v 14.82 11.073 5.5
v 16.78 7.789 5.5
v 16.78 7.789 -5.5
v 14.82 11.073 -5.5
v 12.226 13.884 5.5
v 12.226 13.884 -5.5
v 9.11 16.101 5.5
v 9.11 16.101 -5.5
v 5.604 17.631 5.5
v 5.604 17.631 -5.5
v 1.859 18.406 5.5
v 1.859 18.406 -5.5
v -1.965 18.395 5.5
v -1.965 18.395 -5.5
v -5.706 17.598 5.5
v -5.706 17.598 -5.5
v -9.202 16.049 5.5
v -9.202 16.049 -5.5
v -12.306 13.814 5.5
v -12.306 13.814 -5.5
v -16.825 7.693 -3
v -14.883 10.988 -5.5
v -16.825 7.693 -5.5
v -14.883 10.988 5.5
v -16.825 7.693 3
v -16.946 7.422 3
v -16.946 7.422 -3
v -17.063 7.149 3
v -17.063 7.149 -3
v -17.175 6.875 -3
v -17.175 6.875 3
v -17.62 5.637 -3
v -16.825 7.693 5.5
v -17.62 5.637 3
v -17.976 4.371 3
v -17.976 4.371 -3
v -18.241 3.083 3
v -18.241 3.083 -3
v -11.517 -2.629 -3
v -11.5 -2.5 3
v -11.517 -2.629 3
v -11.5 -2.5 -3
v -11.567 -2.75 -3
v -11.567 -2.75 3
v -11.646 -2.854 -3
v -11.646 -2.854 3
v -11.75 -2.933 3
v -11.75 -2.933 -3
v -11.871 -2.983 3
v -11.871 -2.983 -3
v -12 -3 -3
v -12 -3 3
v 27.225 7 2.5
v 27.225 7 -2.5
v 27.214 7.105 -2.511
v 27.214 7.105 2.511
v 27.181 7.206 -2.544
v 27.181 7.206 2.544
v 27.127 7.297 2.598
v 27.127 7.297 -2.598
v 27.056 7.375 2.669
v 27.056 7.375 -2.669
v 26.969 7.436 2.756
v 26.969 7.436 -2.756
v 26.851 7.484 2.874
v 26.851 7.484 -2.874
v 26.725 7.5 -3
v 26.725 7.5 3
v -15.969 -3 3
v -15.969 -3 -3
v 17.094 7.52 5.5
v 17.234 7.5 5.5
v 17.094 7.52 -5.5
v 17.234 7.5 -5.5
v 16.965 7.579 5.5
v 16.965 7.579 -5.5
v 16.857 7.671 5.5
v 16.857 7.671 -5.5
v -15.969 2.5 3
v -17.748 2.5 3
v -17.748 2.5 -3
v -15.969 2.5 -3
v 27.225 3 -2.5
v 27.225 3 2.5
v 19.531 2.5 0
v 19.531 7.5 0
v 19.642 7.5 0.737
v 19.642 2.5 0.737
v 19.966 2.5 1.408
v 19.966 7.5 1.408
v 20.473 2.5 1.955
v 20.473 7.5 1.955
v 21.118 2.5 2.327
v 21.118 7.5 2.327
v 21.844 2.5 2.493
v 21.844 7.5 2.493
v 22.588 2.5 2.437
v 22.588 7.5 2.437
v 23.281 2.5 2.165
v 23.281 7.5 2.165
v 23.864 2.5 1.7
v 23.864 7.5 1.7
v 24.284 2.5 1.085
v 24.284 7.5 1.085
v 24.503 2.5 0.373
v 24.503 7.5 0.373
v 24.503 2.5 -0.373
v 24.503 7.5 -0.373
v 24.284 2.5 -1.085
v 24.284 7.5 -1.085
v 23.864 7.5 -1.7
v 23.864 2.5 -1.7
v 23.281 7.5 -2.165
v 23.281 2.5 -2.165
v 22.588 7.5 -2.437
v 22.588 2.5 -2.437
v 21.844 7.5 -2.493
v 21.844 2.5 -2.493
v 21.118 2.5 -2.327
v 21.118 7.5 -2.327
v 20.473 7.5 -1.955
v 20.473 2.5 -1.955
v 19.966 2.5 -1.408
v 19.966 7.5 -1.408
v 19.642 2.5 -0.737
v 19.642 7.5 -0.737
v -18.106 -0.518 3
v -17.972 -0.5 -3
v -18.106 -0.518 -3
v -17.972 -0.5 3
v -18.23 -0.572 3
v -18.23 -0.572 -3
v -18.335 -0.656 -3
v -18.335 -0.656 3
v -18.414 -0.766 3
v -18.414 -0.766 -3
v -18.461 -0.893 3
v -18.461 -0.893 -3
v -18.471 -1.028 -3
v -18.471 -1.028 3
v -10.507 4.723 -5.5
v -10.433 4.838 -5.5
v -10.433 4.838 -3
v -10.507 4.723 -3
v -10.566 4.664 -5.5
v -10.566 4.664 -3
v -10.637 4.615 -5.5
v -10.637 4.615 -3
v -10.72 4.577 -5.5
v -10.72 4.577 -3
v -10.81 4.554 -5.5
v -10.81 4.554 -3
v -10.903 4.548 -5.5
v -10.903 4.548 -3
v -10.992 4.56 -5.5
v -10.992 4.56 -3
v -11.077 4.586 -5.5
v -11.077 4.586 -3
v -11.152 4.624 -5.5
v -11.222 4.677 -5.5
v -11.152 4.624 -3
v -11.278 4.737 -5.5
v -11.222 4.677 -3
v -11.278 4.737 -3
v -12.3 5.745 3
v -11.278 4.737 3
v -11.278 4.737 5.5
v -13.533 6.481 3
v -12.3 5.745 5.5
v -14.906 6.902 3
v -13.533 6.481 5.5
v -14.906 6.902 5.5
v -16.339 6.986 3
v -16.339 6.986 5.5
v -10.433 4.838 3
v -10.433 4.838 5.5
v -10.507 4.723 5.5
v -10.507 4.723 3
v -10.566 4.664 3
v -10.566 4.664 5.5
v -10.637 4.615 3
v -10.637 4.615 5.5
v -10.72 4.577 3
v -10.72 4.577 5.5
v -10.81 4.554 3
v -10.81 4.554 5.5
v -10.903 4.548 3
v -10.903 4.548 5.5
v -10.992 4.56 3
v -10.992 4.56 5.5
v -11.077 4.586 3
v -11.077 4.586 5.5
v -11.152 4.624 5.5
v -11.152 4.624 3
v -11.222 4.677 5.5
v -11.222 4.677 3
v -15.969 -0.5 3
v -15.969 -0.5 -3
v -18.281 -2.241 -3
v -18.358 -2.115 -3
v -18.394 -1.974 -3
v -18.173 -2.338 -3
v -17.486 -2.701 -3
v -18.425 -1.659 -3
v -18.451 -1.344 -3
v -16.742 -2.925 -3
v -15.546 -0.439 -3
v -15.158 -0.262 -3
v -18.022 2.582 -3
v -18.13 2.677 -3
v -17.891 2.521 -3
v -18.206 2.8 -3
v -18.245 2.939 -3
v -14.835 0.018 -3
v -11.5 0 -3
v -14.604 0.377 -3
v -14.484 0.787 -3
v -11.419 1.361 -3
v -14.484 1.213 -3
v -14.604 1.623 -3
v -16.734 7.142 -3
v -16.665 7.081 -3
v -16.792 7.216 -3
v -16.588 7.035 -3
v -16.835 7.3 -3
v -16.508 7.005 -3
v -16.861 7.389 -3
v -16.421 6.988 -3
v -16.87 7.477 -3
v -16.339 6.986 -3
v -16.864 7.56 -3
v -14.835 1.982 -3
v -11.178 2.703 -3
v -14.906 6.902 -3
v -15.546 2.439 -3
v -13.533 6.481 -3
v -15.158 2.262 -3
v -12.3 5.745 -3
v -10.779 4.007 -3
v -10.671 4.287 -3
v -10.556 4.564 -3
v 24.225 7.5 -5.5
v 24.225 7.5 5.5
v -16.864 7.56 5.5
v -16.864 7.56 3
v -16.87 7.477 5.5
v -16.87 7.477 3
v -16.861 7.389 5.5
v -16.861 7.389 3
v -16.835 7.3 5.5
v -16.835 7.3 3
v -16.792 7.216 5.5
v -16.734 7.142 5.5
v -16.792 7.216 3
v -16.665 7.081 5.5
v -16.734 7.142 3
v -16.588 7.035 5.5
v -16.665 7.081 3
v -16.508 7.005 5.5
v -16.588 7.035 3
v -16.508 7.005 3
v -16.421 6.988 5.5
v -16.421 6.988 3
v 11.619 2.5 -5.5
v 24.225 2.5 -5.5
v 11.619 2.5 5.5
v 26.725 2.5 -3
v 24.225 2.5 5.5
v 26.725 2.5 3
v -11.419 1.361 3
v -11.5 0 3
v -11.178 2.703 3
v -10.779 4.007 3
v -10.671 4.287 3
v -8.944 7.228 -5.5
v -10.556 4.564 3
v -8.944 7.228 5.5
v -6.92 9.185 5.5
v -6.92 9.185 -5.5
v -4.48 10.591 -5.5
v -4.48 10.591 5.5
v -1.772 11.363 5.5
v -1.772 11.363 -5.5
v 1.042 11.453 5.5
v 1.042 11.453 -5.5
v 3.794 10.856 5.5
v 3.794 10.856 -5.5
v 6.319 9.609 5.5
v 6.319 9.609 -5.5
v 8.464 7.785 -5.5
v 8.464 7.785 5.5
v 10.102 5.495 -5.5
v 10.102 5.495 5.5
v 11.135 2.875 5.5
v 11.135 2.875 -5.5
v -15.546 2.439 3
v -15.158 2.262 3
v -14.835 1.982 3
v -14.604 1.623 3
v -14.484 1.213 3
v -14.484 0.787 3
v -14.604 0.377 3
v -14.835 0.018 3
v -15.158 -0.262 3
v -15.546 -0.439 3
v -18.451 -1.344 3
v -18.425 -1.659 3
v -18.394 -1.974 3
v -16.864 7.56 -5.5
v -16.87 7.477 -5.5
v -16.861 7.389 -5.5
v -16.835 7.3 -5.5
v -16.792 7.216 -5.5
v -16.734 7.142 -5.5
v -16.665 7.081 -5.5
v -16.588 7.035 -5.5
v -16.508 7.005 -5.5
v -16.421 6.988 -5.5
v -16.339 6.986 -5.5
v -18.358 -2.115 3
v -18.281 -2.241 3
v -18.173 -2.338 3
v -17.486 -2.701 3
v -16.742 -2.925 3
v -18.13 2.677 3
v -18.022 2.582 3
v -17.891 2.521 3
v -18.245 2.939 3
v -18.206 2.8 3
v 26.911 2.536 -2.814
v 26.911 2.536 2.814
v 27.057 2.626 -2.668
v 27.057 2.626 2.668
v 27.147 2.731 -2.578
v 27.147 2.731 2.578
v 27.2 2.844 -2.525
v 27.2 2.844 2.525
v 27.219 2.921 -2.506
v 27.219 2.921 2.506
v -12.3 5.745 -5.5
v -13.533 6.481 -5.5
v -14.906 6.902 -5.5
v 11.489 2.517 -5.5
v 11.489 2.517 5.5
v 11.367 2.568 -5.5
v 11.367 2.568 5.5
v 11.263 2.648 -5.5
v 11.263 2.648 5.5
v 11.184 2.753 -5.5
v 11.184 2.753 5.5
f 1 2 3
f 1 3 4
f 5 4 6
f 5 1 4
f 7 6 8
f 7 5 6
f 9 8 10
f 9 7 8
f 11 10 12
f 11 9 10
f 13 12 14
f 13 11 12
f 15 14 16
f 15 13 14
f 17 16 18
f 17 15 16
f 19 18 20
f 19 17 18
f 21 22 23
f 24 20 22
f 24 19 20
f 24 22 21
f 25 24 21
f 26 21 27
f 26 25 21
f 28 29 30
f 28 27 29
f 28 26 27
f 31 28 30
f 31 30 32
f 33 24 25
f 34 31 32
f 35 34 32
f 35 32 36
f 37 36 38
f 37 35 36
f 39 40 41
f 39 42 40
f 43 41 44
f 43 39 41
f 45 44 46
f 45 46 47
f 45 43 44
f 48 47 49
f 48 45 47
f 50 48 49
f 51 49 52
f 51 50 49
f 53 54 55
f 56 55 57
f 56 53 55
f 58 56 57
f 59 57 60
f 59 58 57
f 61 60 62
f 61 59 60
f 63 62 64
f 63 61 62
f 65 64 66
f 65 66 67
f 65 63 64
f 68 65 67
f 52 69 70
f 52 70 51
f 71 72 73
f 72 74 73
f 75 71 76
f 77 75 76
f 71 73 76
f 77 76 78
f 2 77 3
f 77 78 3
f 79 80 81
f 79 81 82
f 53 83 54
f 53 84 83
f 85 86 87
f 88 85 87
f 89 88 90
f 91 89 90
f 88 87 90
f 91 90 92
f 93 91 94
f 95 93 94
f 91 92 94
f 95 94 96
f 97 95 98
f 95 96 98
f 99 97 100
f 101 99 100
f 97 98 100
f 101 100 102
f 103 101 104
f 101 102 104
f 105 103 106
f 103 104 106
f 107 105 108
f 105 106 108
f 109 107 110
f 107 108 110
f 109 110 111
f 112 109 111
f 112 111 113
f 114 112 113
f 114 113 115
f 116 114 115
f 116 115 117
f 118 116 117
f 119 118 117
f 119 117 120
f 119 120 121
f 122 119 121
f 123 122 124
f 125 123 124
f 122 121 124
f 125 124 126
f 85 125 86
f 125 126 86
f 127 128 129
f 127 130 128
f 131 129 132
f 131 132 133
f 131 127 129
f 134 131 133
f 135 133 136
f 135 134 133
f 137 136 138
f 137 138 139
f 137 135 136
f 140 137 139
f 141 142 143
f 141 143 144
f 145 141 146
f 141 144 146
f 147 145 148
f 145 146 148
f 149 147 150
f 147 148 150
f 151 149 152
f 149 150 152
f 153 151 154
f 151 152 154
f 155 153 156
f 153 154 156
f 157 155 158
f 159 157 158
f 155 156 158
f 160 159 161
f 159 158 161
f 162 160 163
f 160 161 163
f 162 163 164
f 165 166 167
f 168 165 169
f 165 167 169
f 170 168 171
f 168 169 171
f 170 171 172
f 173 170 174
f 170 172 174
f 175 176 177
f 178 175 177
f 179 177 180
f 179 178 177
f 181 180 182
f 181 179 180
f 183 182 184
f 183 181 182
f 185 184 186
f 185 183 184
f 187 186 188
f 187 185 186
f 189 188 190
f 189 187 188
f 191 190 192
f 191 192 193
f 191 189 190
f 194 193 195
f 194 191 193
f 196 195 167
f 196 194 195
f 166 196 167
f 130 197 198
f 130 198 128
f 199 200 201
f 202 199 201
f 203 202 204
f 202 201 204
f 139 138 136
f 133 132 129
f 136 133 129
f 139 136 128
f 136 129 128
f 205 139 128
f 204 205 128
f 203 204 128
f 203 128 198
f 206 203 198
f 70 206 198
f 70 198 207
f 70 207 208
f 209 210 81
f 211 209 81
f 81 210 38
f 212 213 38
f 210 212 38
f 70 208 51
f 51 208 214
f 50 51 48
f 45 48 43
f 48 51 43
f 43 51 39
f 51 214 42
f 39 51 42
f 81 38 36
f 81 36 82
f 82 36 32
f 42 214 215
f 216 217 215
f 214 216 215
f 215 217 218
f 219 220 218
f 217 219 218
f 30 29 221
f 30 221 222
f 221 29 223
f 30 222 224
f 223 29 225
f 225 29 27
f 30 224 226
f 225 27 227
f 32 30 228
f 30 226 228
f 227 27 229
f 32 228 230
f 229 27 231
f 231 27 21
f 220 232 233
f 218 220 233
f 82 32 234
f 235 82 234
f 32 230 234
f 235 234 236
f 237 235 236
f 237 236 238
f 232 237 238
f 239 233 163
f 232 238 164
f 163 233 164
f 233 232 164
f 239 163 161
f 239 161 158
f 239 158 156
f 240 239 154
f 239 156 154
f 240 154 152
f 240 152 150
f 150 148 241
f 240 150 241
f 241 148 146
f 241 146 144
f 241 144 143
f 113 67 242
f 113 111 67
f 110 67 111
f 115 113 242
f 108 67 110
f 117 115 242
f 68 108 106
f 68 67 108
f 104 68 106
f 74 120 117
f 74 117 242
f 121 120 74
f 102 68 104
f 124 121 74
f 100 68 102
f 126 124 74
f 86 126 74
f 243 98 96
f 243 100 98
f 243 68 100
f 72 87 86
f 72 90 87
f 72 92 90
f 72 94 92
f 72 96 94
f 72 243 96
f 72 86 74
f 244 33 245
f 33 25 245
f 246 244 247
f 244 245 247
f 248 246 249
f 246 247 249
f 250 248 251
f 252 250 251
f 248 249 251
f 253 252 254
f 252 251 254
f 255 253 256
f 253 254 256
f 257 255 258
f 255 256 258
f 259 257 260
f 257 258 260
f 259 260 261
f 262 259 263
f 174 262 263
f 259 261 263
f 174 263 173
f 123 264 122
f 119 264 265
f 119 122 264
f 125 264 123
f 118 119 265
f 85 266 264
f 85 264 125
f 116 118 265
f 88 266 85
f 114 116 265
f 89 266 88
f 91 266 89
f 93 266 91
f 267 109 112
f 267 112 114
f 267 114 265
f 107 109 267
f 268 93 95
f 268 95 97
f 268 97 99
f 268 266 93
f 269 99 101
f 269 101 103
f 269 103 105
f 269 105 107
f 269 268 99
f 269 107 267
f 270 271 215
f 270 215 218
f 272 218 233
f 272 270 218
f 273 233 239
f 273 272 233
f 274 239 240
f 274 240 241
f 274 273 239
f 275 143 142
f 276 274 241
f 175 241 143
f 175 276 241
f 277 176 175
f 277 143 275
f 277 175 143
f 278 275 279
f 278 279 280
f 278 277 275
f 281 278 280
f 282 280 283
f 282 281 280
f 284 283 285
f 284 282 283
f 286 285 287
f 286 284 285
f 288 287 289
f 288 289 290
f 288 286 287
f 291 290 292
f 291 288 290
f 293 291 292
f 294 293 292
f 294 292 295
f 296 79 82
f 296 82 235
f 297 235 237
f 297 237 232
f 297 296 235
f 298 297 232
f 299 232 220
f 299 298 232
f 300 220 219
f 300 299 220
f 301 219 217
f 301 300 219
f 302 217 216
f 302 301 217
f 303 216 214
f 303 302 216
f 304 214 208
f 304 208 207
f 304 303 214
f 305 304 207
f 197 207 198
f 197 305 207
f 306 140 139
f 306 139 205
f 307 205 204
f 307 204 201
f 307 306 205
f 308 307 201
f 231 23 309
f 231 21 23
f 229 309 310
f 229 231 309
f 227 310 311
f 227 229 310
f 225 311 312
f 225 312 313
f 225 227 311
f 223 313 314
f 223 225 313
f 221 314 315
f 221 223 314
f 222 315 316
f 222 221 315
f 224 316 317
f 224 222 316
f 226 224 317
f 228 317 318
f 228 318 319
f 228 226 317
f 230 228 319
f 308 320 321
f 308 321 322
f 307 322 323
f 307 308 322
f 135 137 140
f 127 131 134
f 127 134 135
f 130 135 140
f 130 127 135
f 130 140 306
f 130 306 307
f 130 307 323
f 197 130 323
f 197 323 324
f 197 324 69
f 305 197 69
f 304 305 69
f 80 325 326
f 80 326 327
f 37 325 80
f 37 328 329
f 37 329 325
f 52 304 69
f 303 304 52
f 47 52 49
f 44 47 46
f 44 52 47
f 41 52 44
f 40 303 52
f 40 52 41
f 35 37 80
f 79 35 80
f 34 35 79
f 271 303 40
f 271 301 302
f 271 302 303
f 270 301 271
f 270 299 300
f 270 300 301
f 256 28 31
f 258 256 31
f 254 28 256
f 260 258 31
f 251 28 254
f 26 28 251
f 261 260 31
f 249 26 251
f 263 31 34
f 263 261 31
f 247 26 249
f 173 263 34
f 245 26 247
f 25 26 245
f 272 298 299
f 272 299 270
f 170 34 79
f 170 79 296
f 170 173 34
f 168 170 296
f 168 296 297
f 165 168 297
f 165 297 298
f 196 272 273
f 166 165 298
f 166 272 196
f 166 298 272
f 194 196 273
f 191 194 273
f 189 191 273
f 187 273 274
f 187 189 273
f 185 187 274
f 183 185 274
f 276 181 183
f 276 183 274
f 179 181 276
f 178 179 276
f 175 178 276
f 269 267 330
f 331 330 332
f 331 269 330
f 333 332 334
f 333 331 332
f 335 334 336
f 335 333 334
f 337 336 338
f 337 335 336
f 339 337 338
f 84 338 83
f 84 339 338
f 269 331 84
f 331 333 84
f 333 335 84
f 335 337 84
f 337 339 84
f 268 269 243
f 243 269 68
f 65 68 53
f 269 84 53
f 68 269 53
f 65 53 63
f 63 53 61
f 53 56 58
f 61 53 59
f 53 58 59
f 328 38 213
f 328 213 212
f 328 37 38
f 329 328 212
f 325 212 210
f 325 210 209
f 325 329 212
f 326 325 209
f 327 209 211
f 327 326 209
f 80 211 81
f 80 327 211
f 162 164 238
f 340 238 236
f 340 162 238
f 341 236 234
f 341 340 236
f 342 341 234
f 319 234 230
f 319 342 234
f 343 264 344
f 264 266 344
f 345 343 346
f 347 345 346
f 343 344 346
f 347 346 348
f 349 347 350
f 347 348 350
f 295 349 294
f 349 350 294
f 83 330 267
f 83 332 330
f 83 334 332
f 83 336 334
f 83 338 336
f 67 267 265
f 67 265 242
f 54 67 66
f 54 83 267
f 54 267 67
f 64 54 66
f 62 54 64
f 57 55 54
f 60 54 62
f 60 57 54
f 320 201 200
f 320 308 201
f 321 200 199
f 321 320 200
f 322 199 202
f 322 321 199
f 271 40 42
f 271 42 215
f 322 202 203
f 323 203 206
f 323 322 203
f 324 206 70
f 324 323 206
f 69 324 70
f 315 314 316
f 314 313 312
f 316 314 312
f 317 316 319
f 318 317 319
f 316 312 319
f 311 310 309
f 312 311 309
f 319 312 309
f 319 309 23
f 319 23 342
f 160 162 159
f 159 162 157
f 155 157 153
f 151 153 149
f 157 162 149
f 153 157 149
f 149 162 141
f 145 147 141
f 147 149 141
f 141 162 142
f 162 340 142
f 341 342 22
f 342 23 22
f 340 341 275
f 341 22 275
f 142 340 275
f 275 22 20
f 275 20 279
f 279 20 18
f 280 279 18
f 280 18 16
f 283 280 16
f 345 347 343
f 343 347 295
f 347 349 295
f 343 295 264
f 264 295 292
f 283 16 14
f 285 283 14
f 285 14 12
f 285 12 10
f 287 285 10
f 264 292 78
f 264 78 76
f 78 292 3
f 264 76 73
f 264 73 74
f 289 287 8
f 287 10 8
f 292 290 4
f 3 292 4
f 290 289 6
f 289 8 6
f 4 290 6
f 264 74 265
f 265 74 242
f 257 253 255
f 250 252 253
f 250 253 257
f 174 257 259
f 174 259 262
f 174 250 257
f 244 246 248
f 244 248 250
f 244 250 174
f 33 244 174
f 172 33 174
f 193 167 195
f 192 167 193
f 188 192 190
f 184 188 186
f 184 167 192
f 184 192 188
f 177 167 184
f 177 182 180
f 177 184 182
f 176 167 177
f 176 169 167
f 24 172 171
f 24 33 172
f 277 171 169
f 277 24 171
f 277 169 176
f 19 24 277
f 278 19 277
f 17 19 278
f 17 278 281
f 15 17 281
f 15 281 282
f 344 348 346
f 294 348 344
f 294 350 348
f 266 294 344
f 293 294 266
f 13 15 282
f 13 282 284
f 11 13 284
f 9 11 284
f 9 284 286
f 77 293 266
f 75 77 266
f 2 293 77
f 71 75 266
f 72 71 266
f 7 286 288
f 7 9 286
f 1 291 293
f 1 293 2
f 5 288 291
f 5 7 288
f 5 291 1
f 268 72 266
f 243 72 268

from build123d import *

# Parameters (mm, degrees)
F1_DEPTH = 5.5
F3_DEPTH = 2.5
F5_R     = 2.5
F6_DEPTH = 5
F7_SIZE  = 3
F8_R     = 0.5


# Not quite as in the source:
# - a feature names something its author has since deleted; it is built from what else it names


with BuildPart() as f1:
    # F0 (on Top) → F1 (new body)
    with BuildSketch(Plane.XY):
        with BuildLine():
            ThreePointArc((-11.5, 0), (-1.2575412829, 11.4310362576), (11.2249721603, 2.5))
            Line((11.2249721603, 2.5), (27.2249721603, 2.5))
            Line((27.2249721603, 2.5), (27.2249721603, 7.5))
            Line((27.2249721603, 7.5), (16.9115345253, 7.5))
            ThreePointArc((16.9115345253, 7.5), (-2.5986969504, 18.3165710263), (-18.3303027798, 2.5))
            Line((-18.3303027798, 2.5), (-15.9687194227, 2.5))
            ThreePointArc((-15.9687194227, 2.5), (-14.4687194227, 1), (-15.9687194227, -0.5))
            Line((-15.9687194227, -0.5), (-18.4932420089, -0.5))
            ThreePointArc((-18.4932420089, -0.5), (-18.4505725724, -1.3514332211), (-18.3687238121, -2.1999967079))
            ThreePointArc((-18.3687238121, -2.1999967079), (-17.2336330893, -2.7947323247), (-15.9687194227, -3))
            Line((-15.9687194227, -3), (-11.5, -3))
            Line((-11.5, -3), (-11.5, 0))
        make_face()
    extrude(amount=F1_DEPTH)

    # F2 (on face) → F3 (cut)
    with BuildSketch(Plane.XY.offset(5.5)):
        with BuildLine():
            Line((-15.9687194227, -3), (-11.5, -3))
            Line((-11.5, -3), (-11.5, 0))
            ThreePointArc((-11.5, 0), (-11.3184211539, 2.0355202239), (-10.7794186814, 4.0067608976))
            ThreePointArc((-10.7794186814, 4.0067608976), (-13.5146873094, 6.472401636), (-17.1751666268, 6.8748564597))
            ThreePointArc((-17.1751666268, 6.8748564597), (-17.8869905716, 4.7228771203), (-18.3303027798, 2.5))
            Line((-18.3303027798, 2.5), (-15.9687194227, 2.5))
            ThreePointArc((-15.9687194227, 2.5), (-14.4687194227, 1), (-15.9687194227, -0.5))
            Line((-15.9687194227, -0.5), (-18.4932420089, -0.5))
            ThreePointArc((-18.4932420089, -0.5), (-18.4505725724, -1.3514332211), (-18.3687238121, -2.1999967079))
            ThreePointArc((-18.3687238121, -2.1999967079), (-17.2336330893, -2.7947323247), (-15.9687194227, -3))
        make_face()
    extrude(amount=-F3_DEPTH, mode=Mode.SUBTRACT)

    # F4: F1 across plane


with BuildPart() as f1_1:
    add(f1.part)
    add(f1.part.mirror(Plane.XY))

    # F5 (on face) → F6 (cut, through all)
    with BuildSketch(Plane(origin=(0, 7.5, 0), x_dir=(-1, 0, 0), z_dir=(0, 1, 0))):
        with Locations((-22.0312805773, 0)):
            Circle(F5_R)
    extrude(amount=-F6_DEPTH, mode=Mode.SUBTRACT)

    # F7
    f7_edges = [f1_1.edges().sort_by_distance(p)[0] for p in [
        (27.224972, 5, 5.5),
        (27.224972, 5, -5.5),
    ]]
    chamfer(f7_edges, length=F7_SIZE)

    # F8
    f8_edges = [f1_1.edges().sort_by_distance(p)[0] for p in [
        (-11.5, -3, 0),
        (-10.779419, 4.006761, 4.25),
        (-10.779419, 4.006761, -4.25),
        (-17.175167, 6.874856, 4.25),
        (-17.175167, 6.874856, -4.25),
        (-18.368724, -2.199997, 0),
        (-18.493242, -0.5, 0),
        (-18.330303, 2.5, 0),
        (11.224972, 2.5, 0),
        (16.911535, 7.5, 0),
        (27.224972, 2.5, 0),
        (27.224972, 7.5, 0),
    ]]
    fillet(f8_edges, radius=F8_R)


solid = f1_1.part
